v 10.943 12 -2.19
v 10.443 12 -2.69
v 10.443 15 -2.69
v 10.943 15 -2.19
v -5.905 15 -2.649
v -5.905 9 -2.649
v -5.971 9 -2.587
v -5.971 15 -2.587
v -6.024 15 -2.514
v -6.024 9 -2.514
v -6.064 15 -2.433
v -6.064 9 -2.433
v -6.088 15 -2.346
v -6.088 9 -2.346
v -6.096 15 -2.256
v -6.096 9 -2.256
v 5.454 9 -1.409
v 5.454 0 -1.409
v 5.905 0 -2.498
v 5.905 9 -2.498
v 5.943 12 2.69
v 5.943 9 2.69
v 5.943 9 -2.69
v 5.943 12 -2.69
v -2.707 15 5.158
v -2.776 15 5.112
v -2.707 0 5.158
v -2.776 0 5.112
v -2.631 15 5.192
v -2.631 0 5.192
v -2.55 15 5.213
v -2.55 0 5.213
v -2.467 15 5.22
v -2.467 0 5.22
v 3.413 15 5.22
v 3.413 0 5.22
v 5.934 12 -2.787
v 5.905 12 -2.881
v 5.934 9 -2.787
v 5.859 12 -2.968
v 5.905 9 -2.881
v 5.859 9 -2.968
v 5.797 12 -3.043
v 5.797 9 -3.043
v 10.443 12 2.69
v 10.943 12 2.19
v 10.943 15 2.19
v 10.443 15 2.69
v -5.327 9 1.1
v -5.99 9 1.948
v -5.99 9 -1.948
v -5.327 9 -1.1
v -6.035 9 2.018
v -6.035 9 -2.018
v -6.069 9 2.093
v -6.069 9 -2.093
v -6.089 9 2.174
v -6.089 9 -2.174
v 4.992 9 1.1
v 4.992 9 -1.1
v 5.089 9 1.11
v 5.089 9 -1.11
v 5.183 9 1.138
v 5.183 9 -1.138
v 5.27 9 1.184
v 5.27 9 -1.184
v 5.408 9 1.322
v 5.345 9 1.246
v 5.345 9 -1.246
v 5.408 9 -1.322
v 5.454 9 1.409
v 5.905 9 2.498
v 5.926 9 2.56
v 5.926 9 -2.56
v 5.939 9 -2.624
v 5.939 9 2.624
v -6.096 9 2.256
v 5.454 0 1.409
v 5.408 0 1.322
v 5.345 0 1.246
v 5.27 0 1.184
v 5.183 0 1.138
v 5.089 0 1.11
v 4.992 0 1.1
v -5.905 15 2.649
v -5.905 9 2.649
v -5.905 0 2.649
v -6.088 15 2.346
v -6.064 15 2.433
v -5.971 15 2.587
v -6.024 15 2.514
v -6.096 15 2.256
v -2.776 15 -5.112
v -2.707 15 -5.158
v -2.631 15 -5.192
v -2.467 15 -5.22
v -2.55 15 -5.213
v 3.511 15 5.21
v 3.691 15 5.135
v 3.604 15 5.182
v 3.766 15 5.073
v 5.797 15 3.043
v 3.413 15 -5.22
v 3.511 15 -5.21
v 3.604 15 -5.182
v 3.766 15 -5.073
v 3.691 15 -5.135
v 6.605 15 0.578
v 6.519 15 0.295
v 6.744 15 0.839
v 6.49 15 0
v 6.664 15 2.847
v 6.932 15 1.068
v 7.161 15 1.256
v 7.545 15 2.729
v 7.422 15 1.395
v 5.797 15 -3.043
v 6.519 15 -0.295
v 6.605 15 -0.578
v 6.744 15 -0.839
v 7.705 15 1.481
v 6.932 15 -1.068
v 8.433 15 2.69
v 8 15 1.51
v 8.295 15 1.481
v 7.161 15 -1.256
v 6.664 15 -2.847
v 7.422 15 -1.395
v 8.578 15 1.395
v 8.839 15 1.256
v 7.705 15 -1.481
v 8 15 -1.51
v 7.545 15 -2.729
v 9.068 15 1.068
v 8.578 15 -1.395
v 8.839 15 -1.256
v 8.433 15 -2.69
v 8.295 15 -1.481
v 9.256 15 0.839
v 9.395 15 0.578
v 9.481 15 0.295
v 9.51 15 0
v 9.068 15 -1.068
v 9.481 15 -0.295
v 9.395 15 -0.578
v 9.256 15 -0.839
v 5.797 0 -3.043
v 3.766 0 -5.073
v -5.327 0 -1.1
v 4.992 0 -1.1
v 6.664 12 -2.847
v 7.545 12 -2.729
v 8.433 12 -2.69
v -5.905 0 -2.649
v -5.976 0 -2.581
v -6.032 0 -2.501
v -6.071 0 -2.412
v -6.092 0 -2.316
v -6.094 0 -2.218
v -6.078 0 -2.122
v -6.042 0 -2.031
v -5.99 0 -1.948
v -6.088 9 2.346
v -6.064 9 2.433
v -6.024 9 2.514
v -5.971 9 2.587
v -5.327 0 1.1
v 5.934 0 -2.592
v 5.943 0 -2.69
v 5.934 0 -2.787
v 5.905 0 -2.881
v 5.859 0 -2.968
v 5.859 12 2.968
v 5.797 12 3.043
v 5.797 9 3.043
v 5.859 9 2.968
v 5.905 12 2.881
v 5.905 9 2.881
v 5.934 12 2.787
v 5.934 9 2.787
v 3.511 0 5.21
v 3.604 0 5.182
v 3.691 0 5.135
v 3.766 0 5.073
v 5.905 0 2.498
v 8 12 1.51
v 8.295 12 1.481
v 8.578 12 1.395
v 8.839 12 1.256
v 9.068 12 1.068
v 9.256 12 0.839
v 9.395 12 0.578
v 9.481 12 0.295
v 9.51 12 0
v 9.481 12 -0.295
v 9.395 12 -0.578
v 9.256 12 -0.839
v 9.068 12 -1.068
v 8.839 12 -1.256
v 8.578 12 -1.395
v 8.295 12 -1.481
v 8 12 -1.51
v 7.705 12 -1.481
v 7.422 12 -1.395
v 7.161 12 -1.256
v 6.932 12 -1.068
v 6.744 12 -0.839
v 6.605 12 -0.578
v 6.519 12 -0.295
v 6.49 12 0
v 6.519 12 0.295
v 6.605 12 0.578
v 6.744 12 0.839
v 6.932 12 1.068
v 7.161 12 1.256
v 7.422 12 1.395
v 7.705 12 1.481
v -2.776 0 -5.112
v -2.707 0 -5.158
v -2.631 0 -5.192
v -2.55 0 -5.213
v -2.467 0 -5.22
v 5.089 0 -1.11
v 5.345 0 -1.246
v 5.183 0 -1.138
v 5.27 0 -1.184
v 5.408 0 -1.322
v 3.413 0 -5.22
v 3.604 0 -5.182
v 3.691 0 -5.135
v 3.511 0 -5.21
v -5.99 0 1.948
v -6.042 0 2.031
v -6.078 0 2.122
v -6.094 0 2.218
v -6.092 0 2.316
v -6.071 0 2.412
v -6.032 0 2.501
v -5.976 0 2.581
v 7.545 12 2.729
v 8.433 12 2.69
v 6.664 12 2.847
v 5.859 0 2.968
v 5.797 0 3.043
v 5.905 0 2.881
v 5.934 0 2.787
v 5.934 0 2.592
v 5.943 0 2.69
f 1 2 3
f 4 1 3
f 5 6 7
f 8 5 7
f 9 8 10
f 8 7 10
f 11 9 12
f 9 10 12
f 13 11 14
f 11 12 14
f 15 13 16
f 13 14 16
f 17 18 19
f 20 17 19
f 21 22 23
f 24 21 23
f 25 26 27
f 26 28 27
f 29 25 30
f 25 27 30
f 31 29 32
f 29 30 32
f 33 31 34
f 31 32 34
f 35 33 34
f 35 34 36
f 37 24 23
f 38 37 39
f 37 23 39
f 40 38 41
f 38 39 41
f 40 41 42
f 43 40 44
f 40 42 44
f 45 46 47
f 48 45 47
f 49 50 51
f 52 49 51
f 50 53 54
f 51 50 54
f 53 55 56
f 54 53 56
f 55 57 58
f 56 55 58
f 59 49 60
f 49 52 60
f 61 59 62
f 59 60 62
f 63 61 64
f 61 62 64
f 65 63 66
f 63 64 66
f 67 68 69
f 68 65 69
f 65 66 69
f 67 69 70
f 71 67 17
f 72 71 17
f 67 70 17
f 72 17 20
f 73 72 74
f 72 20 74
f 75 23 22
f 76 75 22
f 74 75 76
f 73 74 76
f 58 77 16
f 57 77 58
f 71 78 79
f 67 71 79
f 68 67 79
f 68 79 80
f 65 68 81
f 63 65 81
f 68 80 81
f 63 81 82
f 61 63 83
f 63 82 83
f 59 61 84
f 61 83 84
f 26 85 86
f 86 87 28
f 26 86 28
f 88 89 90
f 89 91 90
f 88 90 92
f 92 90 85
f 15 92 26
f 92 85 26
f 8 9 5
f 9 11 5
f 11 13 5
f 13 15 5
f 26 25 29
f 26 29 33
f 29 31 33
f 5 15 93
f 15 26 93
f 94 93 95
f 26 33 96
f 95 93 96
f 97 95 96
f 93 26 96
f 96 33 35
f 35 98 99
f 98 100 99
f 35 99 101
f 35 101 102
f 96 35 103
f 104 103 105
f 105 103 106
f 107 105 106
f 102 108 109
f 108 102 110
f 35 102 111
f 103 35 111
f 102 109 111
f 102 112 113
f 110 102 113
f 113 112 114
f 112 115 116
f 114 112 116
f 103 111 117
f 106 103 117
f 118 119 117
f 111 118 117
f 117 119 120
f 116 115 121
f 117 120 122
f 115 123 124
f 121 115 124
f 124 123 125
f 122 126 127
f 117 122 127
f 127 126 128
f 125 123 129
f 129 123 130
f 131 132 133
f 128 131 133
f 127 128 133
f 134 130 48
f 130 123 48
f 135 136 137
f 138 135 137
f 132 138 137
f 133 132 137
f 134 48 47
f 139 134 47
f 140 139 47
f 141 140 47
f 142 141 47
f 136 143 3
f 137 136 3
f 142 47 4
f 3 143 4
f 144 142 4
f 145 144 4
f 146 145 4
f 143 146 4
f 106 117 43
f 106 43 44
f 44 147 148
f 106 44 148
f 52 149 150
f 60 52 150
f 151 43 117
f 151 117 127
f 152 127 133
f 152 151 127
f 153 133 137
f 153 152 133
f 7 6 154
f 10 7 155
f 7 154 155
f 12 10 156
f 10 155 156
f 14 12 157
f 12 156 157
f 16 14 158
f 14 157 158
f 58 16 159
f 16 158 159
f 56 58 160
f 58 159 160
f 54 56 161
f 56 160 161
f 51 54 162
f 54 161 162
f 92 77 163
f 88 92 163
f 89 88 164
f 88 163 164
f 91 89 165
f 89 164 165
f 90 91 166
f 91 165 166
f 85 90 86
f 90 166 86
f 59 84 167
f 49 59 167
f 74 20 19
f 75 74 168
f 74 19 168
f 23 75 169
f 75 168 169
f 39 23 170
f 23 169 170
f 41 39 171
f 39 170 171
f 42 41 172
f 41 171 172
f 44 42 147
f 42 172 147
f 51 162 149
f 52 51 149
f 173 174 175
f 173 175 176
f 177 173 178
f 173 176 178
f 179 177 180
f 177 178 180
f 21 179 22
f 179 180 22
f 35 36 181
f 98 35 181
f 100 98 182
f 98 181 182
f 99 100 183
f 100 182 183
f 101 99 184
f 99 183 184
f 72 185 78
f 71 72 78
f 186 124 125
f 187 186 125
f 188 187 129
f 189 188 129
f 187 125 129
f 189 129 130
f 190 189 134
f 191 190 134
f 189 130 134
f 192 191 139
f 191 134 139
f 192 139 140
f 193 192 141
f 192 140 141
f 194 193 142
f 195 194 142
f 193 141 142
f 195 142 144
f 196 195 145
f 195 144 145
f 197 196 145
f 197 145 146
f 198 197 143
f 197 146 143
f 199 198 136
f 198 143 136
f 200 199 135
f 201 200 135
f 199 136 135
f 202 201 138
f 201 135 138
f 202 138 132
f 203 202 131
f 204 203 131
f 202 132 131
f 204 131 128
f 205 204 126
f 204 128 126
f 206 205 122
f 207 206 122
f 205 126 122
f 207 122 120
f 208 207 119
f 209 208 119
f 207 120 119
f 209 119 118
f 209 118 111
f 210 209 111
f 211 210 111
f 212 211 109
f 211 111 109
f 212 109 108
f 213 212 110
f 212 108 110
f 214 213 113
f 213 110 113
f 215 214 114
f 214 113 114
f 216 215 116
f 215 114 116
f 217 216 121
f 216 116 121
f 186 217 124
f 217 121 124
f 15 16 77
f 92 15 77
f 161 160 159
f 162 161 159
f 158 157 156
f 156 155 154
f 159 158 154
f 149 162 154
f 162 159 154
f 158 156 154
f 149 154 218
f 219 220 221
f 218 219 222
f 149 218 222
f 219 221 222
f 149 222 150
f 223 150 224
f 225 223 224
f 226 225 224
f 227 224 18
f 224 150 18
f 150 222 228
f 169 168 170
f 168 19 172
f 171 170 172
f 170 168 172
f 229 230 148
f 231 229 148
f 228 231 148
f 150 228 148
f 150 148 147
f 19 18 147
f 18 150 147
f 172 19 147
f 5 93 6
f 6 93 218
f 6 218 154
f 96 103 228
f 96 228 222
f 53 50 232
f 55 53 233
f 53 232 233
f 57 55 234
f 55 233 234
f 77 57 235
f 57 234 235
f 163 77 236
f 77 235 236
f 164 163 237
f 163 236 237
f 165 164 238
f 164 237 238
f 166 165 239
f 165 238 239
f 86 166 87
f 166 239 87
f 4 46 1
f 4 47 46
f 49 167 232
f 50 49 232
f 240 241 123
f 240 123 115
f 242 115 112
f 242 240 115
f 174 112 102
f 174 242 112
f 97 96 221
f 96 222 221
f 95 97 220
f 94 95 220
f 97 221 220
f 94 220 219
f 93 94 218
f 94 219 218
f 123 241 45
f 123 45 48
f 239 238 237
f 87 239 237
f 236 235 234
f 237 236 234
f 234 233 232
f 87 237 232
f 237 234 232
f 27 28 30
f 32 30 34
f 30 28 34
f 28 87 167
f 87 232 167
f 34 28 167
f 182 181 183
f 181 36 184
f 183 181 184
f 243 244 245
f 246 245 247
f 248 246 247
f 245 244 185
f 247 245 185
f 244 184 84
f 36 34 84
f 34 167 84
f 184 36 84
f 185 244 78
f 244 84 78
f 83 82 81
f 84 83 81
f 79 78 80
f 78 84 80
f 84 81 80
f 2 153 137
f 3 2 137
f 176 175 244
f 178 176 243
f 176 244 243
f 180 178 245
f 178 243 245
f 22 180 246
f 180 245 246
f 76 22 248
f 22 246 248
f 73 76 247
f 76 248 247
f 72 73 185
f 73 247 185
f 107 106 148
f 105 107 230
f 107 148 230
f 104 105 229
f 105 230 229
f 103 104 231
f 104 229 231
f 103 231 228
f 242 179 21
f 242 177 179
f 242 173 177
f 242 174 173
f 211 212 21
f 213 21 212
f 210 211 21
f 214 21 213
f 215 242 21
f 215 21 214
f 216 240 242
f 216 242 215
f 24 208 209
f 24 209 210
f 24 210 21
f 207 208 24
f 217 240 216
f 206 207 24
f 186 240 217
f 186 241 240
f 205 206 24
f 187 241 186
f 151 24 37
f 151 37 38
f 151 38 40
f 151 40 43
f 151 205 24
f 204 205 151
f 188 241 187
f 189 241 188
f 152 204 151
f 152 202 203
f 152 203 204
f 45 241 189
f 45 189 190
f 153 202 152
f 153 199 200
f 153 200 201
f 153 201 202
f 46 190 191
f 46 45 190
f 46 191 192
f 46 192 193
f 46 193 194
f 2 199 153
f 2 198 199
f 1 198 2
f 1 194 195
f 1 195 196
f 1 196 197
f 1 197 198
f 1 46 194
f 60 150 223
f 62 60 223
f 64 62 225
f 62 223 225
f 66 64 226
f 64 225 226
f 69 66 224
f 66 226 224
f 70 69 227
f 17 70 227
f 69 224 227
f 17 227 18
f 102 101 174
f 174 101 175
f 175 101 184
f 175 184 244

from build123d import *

# Parameters (mm, degrees)
EXTRUDE_1_DEPTH     = 9
EXTRUDE_1_2_DEPTH   = 9
EXTRUDE_2_DEPTH     = 6
SKETCH_7_W          = 5.379535364
SKETCH_7_H          = 3
EXTRUDE_3_DEPTH     = 5
FILLET_1_R          = 10
CHAMFER_1_SIZE      = 0.5
SKETCH_8_R          = 1.51
CUT_EXTRUDE_1_DEPTH = 3


with BuildPart() as part:
    # 草图4 → 凸台-拉伸1 (new body)
    with BuildSketch(Plane(origin=(0, 0, 0), x_dir=(1, 0, 0), z_dir=(0, 1, 0))):
        with BuildLine():
            Line((-5.326508943, 1.1), (4.991869226, 1.1))
            ThreePointArc((4.991869226, 1.1), (5.269632733, 1.184250756), (5.453789099, 1.408610265))
            Line((5.453789099, 1.408610265), (5.90531838, 2.498377946))
            ThreePointArc((5.90531838, 2.498377946), (5.933789047, 2.787323397), (5.796899922, 3.04337304))
            Line((5.796899922, 3.04337304), (3.766484258, 5.073191861))
            ThreePointArc((3.766484258, 5.073191861), (3.604290607, 5.181540331), (3.412982843, 5.219586503))
            Line((3.412982843, 5.219586503), (-2.466960198, 5.219586503))
            ThreePointArc((-2.466960198, 5.219586503), (-2.630617478, 5.19204422), (-2.776244778, 5.112451681))
            Line((-2.776244778, 5.112451681), (-5.905207067, 2.649164418))
            ThreePointArc((-5.905207067, 2.649164418), (-6.092318767, 2.31622196), (-5.989810106, 1.948317839))
            Line((-5.989810106, 1.948317839), (-5.326508943, 1.1))
        make_face()
    extrude(amount=EXTRUDE_1_DEPTH)



with BuildPart() as body_2:
    # 草图4 → Extrude 1 2 (new body)
    with BuildSketch(Plane(origin=(0, 0, 0), x_dir=(1, 0, 0), z_dir=(0, 1, 0))):
        with BuildLine():
            Line((3.766484258, -5.073191861), (5.796899922, -3.04337304))
            ThreePointArc((5.796899922, -3.04337304), (5.933789047, -2.787323397), (5.90531838, -2.498377946))
            Line((5.90531838, -2.498377946), (5.453789099, -1.408610265))
            ThreePointArc((5.453789099, -1.408610265), (5.269632733, -1.184250756), (4.991869226, -1.1))
            Line((4.991869226, -1.1), (-5.326508943, -1.1))
            Line((-5.326508943, -1.1), (-5.989810106, -1.948317839))
            ThreePointArc((-5.989810106, -1.948317839), (-6.092318767, -2.31622196), (-5.905207067, -2.649164418))
            Line((-5.905207067, -2.649164418), (-2.776244778, -5.112451681))
            ThreePointArc((-2.776244778, -5.112451681), (-2.630617478, -5.19204422), (-2.466960198, -5.219586503))
            Line((-2.466960198, -5.219586503), (3.412982843, -5.219586503))
            ThreePointArc((3.412982843, -5.219586503), (3.604290607, -5.181540331), (3.766484258, -5.073191861))
        make_face()
    extrude(amount=EXTRUDE_1_2_DEPTH)


with BuildPart() as part_1:
    add(part.part)

    add(body_2.part)  # 凸台-拉伸2 merges body 2
    # 草图5 → 凸台-拉伸2 (add)
    with BuildSketch(Plane(origin=(0, 9, 0), x_dir=(1, 0, 0), z_dir=(0, 1, 0))):
        with BuildLine():
            Line((3.766484258, -5.073191861), (5.796899922, -3.04337304))
            ThreePointArc((5.796899922, -3.04337304), (5.905324208, -2.881143349), (5.943398507, -2.689767682))
            Line((5.943398507, -2.689767682), (5.943398507, 2.689767682))
            ThreePointArc((5.943398507, 2.689767682), (5.905324208, 2.881143349), (5.796899922, 3.04337304))
            Line((5.796899922, 3.04337304), (3.766484258, 5.073191861))
            ThreePointArc((3.766484258, 5.073191861), (3.604290607, 5.181540331), (3.412982843, 5.219586503))
            Line((3.412982843, 5.219586503), (-2.466960198, 5.219586503))
            ThreePointArc((-2.466960198, 5.219586503), (-2.630617478, 5.19204422), (-2.776244778, 5.112451681))
            Line((-2.776244778, 5.112451681), (-5.905207067, 2.649164418))
            ThreePointArc((-5.905207067, 2.649164418), (-6.045723715, 2.474654122), (-6.095922486, 2.256299239))
            Line((-6.095922486, 2.256299239), (-6.095922486, -2.256299239))
            ThreePointArc((-6.095922486, -2.256299239), (-6.045723715, -2.474654122), (-5.905207067, -2.649164418))
            Line((-5.905207067, -2.649164418), (-2.776244778, -5.112451681))
            ThreePointArc((-2.776244778, -5.112451681), (-2.630617478, -5.19204422), (-2.466960198, -5.219586503))
            Line((-2.466960198, -5.219586503), (3.412982843, -5.219586503))
            ThreePointArc((3.412982843, -5.219586503), (3.604290607, -5.181540331), (3.766484258, -5.073191861))
        make_face()
    extrude(amount=EXTRUDE_2_DEPTH)

    # 草图7 → 凸台-拉伸3 (add)
    with BuildSketch(Plane(origin=(5.943398507, 0, 0), x_dir=(0, 0, -1), z_dir=(1, 0, 0))):
        with Locations((0, 13.5)):
            Rectangle(SKETCH_7_W, SKETCH_7_H)
    extrude(amount=EXTRUDE_3_DEPTH)

    # 圆角1
    # the kernel refuses this fillet: 10 mm, written as the material it adds along each edge
    with BuildSketch(Plane(origin=(5.943398507, 12, -2.689767682), x_dir=(-0.38275133514604787, 0, -0.923851403334929), z_dir=(0, 1, 0))) as fillet_1_piece_1:
        with BuildLine():
            CenterArc((8.285757547, -6.127192899), FILLET_1_R, 142.213613886, 15.282174956)
            Line((-0.952756487, -2.299679547), (0, 0))
            ThreePointArc((0, 0), (0.191375668, -0.038074298), (0.382751335, 0))
        make_face()
    extrude(amount=3)
    with BuildSketch(Plane(origin=(5.943398507, 12, 2.689767682), x_dir=(-0.3827513351460759, 0, 0.9238514033349174), z_dir=(0, 1, 0))) as fillet_1_piece_2:
        with BuildLine():
            CenterArc((8.285757547, 6.127192899), FILLET_1_R, 202.504211157, 15.282174956)
            Line((-0.952756487, 2.299679547), (0, 0))
            ThreePointArc((0, 0), (0.191375668, 0.038074298), (0.382751335, 0))
        make_face()
    extrude(amount=3)

    # 倒角1
    chamfer_1_edges = [part_1.edges().sort_by_distance(p)[0] for p in [
        (10.943398507, 13.5, -2.689767682),
        (10.943398507, 13.5, 2.689767682),
    ]]
    chamfer(chamfer_1_edges, length=CHAMFER_1_SIZE)

    # 草图8 → 切除-拉伸1 (cut)
    with BuildSketch(Plane(origin=(0, 15, 0), x_dir=(1, 0, 0), z_dir=(0, 1, 0))):
        with Locations(Location((8, 0, 0), (0, 0, 270))):
            Circle(SKETCH_8_R)
    extrude(amount=-CUT_EXTRUDE_1_DEPTH, mode=Mode.SUBTRACT)


solid = part_1.part
